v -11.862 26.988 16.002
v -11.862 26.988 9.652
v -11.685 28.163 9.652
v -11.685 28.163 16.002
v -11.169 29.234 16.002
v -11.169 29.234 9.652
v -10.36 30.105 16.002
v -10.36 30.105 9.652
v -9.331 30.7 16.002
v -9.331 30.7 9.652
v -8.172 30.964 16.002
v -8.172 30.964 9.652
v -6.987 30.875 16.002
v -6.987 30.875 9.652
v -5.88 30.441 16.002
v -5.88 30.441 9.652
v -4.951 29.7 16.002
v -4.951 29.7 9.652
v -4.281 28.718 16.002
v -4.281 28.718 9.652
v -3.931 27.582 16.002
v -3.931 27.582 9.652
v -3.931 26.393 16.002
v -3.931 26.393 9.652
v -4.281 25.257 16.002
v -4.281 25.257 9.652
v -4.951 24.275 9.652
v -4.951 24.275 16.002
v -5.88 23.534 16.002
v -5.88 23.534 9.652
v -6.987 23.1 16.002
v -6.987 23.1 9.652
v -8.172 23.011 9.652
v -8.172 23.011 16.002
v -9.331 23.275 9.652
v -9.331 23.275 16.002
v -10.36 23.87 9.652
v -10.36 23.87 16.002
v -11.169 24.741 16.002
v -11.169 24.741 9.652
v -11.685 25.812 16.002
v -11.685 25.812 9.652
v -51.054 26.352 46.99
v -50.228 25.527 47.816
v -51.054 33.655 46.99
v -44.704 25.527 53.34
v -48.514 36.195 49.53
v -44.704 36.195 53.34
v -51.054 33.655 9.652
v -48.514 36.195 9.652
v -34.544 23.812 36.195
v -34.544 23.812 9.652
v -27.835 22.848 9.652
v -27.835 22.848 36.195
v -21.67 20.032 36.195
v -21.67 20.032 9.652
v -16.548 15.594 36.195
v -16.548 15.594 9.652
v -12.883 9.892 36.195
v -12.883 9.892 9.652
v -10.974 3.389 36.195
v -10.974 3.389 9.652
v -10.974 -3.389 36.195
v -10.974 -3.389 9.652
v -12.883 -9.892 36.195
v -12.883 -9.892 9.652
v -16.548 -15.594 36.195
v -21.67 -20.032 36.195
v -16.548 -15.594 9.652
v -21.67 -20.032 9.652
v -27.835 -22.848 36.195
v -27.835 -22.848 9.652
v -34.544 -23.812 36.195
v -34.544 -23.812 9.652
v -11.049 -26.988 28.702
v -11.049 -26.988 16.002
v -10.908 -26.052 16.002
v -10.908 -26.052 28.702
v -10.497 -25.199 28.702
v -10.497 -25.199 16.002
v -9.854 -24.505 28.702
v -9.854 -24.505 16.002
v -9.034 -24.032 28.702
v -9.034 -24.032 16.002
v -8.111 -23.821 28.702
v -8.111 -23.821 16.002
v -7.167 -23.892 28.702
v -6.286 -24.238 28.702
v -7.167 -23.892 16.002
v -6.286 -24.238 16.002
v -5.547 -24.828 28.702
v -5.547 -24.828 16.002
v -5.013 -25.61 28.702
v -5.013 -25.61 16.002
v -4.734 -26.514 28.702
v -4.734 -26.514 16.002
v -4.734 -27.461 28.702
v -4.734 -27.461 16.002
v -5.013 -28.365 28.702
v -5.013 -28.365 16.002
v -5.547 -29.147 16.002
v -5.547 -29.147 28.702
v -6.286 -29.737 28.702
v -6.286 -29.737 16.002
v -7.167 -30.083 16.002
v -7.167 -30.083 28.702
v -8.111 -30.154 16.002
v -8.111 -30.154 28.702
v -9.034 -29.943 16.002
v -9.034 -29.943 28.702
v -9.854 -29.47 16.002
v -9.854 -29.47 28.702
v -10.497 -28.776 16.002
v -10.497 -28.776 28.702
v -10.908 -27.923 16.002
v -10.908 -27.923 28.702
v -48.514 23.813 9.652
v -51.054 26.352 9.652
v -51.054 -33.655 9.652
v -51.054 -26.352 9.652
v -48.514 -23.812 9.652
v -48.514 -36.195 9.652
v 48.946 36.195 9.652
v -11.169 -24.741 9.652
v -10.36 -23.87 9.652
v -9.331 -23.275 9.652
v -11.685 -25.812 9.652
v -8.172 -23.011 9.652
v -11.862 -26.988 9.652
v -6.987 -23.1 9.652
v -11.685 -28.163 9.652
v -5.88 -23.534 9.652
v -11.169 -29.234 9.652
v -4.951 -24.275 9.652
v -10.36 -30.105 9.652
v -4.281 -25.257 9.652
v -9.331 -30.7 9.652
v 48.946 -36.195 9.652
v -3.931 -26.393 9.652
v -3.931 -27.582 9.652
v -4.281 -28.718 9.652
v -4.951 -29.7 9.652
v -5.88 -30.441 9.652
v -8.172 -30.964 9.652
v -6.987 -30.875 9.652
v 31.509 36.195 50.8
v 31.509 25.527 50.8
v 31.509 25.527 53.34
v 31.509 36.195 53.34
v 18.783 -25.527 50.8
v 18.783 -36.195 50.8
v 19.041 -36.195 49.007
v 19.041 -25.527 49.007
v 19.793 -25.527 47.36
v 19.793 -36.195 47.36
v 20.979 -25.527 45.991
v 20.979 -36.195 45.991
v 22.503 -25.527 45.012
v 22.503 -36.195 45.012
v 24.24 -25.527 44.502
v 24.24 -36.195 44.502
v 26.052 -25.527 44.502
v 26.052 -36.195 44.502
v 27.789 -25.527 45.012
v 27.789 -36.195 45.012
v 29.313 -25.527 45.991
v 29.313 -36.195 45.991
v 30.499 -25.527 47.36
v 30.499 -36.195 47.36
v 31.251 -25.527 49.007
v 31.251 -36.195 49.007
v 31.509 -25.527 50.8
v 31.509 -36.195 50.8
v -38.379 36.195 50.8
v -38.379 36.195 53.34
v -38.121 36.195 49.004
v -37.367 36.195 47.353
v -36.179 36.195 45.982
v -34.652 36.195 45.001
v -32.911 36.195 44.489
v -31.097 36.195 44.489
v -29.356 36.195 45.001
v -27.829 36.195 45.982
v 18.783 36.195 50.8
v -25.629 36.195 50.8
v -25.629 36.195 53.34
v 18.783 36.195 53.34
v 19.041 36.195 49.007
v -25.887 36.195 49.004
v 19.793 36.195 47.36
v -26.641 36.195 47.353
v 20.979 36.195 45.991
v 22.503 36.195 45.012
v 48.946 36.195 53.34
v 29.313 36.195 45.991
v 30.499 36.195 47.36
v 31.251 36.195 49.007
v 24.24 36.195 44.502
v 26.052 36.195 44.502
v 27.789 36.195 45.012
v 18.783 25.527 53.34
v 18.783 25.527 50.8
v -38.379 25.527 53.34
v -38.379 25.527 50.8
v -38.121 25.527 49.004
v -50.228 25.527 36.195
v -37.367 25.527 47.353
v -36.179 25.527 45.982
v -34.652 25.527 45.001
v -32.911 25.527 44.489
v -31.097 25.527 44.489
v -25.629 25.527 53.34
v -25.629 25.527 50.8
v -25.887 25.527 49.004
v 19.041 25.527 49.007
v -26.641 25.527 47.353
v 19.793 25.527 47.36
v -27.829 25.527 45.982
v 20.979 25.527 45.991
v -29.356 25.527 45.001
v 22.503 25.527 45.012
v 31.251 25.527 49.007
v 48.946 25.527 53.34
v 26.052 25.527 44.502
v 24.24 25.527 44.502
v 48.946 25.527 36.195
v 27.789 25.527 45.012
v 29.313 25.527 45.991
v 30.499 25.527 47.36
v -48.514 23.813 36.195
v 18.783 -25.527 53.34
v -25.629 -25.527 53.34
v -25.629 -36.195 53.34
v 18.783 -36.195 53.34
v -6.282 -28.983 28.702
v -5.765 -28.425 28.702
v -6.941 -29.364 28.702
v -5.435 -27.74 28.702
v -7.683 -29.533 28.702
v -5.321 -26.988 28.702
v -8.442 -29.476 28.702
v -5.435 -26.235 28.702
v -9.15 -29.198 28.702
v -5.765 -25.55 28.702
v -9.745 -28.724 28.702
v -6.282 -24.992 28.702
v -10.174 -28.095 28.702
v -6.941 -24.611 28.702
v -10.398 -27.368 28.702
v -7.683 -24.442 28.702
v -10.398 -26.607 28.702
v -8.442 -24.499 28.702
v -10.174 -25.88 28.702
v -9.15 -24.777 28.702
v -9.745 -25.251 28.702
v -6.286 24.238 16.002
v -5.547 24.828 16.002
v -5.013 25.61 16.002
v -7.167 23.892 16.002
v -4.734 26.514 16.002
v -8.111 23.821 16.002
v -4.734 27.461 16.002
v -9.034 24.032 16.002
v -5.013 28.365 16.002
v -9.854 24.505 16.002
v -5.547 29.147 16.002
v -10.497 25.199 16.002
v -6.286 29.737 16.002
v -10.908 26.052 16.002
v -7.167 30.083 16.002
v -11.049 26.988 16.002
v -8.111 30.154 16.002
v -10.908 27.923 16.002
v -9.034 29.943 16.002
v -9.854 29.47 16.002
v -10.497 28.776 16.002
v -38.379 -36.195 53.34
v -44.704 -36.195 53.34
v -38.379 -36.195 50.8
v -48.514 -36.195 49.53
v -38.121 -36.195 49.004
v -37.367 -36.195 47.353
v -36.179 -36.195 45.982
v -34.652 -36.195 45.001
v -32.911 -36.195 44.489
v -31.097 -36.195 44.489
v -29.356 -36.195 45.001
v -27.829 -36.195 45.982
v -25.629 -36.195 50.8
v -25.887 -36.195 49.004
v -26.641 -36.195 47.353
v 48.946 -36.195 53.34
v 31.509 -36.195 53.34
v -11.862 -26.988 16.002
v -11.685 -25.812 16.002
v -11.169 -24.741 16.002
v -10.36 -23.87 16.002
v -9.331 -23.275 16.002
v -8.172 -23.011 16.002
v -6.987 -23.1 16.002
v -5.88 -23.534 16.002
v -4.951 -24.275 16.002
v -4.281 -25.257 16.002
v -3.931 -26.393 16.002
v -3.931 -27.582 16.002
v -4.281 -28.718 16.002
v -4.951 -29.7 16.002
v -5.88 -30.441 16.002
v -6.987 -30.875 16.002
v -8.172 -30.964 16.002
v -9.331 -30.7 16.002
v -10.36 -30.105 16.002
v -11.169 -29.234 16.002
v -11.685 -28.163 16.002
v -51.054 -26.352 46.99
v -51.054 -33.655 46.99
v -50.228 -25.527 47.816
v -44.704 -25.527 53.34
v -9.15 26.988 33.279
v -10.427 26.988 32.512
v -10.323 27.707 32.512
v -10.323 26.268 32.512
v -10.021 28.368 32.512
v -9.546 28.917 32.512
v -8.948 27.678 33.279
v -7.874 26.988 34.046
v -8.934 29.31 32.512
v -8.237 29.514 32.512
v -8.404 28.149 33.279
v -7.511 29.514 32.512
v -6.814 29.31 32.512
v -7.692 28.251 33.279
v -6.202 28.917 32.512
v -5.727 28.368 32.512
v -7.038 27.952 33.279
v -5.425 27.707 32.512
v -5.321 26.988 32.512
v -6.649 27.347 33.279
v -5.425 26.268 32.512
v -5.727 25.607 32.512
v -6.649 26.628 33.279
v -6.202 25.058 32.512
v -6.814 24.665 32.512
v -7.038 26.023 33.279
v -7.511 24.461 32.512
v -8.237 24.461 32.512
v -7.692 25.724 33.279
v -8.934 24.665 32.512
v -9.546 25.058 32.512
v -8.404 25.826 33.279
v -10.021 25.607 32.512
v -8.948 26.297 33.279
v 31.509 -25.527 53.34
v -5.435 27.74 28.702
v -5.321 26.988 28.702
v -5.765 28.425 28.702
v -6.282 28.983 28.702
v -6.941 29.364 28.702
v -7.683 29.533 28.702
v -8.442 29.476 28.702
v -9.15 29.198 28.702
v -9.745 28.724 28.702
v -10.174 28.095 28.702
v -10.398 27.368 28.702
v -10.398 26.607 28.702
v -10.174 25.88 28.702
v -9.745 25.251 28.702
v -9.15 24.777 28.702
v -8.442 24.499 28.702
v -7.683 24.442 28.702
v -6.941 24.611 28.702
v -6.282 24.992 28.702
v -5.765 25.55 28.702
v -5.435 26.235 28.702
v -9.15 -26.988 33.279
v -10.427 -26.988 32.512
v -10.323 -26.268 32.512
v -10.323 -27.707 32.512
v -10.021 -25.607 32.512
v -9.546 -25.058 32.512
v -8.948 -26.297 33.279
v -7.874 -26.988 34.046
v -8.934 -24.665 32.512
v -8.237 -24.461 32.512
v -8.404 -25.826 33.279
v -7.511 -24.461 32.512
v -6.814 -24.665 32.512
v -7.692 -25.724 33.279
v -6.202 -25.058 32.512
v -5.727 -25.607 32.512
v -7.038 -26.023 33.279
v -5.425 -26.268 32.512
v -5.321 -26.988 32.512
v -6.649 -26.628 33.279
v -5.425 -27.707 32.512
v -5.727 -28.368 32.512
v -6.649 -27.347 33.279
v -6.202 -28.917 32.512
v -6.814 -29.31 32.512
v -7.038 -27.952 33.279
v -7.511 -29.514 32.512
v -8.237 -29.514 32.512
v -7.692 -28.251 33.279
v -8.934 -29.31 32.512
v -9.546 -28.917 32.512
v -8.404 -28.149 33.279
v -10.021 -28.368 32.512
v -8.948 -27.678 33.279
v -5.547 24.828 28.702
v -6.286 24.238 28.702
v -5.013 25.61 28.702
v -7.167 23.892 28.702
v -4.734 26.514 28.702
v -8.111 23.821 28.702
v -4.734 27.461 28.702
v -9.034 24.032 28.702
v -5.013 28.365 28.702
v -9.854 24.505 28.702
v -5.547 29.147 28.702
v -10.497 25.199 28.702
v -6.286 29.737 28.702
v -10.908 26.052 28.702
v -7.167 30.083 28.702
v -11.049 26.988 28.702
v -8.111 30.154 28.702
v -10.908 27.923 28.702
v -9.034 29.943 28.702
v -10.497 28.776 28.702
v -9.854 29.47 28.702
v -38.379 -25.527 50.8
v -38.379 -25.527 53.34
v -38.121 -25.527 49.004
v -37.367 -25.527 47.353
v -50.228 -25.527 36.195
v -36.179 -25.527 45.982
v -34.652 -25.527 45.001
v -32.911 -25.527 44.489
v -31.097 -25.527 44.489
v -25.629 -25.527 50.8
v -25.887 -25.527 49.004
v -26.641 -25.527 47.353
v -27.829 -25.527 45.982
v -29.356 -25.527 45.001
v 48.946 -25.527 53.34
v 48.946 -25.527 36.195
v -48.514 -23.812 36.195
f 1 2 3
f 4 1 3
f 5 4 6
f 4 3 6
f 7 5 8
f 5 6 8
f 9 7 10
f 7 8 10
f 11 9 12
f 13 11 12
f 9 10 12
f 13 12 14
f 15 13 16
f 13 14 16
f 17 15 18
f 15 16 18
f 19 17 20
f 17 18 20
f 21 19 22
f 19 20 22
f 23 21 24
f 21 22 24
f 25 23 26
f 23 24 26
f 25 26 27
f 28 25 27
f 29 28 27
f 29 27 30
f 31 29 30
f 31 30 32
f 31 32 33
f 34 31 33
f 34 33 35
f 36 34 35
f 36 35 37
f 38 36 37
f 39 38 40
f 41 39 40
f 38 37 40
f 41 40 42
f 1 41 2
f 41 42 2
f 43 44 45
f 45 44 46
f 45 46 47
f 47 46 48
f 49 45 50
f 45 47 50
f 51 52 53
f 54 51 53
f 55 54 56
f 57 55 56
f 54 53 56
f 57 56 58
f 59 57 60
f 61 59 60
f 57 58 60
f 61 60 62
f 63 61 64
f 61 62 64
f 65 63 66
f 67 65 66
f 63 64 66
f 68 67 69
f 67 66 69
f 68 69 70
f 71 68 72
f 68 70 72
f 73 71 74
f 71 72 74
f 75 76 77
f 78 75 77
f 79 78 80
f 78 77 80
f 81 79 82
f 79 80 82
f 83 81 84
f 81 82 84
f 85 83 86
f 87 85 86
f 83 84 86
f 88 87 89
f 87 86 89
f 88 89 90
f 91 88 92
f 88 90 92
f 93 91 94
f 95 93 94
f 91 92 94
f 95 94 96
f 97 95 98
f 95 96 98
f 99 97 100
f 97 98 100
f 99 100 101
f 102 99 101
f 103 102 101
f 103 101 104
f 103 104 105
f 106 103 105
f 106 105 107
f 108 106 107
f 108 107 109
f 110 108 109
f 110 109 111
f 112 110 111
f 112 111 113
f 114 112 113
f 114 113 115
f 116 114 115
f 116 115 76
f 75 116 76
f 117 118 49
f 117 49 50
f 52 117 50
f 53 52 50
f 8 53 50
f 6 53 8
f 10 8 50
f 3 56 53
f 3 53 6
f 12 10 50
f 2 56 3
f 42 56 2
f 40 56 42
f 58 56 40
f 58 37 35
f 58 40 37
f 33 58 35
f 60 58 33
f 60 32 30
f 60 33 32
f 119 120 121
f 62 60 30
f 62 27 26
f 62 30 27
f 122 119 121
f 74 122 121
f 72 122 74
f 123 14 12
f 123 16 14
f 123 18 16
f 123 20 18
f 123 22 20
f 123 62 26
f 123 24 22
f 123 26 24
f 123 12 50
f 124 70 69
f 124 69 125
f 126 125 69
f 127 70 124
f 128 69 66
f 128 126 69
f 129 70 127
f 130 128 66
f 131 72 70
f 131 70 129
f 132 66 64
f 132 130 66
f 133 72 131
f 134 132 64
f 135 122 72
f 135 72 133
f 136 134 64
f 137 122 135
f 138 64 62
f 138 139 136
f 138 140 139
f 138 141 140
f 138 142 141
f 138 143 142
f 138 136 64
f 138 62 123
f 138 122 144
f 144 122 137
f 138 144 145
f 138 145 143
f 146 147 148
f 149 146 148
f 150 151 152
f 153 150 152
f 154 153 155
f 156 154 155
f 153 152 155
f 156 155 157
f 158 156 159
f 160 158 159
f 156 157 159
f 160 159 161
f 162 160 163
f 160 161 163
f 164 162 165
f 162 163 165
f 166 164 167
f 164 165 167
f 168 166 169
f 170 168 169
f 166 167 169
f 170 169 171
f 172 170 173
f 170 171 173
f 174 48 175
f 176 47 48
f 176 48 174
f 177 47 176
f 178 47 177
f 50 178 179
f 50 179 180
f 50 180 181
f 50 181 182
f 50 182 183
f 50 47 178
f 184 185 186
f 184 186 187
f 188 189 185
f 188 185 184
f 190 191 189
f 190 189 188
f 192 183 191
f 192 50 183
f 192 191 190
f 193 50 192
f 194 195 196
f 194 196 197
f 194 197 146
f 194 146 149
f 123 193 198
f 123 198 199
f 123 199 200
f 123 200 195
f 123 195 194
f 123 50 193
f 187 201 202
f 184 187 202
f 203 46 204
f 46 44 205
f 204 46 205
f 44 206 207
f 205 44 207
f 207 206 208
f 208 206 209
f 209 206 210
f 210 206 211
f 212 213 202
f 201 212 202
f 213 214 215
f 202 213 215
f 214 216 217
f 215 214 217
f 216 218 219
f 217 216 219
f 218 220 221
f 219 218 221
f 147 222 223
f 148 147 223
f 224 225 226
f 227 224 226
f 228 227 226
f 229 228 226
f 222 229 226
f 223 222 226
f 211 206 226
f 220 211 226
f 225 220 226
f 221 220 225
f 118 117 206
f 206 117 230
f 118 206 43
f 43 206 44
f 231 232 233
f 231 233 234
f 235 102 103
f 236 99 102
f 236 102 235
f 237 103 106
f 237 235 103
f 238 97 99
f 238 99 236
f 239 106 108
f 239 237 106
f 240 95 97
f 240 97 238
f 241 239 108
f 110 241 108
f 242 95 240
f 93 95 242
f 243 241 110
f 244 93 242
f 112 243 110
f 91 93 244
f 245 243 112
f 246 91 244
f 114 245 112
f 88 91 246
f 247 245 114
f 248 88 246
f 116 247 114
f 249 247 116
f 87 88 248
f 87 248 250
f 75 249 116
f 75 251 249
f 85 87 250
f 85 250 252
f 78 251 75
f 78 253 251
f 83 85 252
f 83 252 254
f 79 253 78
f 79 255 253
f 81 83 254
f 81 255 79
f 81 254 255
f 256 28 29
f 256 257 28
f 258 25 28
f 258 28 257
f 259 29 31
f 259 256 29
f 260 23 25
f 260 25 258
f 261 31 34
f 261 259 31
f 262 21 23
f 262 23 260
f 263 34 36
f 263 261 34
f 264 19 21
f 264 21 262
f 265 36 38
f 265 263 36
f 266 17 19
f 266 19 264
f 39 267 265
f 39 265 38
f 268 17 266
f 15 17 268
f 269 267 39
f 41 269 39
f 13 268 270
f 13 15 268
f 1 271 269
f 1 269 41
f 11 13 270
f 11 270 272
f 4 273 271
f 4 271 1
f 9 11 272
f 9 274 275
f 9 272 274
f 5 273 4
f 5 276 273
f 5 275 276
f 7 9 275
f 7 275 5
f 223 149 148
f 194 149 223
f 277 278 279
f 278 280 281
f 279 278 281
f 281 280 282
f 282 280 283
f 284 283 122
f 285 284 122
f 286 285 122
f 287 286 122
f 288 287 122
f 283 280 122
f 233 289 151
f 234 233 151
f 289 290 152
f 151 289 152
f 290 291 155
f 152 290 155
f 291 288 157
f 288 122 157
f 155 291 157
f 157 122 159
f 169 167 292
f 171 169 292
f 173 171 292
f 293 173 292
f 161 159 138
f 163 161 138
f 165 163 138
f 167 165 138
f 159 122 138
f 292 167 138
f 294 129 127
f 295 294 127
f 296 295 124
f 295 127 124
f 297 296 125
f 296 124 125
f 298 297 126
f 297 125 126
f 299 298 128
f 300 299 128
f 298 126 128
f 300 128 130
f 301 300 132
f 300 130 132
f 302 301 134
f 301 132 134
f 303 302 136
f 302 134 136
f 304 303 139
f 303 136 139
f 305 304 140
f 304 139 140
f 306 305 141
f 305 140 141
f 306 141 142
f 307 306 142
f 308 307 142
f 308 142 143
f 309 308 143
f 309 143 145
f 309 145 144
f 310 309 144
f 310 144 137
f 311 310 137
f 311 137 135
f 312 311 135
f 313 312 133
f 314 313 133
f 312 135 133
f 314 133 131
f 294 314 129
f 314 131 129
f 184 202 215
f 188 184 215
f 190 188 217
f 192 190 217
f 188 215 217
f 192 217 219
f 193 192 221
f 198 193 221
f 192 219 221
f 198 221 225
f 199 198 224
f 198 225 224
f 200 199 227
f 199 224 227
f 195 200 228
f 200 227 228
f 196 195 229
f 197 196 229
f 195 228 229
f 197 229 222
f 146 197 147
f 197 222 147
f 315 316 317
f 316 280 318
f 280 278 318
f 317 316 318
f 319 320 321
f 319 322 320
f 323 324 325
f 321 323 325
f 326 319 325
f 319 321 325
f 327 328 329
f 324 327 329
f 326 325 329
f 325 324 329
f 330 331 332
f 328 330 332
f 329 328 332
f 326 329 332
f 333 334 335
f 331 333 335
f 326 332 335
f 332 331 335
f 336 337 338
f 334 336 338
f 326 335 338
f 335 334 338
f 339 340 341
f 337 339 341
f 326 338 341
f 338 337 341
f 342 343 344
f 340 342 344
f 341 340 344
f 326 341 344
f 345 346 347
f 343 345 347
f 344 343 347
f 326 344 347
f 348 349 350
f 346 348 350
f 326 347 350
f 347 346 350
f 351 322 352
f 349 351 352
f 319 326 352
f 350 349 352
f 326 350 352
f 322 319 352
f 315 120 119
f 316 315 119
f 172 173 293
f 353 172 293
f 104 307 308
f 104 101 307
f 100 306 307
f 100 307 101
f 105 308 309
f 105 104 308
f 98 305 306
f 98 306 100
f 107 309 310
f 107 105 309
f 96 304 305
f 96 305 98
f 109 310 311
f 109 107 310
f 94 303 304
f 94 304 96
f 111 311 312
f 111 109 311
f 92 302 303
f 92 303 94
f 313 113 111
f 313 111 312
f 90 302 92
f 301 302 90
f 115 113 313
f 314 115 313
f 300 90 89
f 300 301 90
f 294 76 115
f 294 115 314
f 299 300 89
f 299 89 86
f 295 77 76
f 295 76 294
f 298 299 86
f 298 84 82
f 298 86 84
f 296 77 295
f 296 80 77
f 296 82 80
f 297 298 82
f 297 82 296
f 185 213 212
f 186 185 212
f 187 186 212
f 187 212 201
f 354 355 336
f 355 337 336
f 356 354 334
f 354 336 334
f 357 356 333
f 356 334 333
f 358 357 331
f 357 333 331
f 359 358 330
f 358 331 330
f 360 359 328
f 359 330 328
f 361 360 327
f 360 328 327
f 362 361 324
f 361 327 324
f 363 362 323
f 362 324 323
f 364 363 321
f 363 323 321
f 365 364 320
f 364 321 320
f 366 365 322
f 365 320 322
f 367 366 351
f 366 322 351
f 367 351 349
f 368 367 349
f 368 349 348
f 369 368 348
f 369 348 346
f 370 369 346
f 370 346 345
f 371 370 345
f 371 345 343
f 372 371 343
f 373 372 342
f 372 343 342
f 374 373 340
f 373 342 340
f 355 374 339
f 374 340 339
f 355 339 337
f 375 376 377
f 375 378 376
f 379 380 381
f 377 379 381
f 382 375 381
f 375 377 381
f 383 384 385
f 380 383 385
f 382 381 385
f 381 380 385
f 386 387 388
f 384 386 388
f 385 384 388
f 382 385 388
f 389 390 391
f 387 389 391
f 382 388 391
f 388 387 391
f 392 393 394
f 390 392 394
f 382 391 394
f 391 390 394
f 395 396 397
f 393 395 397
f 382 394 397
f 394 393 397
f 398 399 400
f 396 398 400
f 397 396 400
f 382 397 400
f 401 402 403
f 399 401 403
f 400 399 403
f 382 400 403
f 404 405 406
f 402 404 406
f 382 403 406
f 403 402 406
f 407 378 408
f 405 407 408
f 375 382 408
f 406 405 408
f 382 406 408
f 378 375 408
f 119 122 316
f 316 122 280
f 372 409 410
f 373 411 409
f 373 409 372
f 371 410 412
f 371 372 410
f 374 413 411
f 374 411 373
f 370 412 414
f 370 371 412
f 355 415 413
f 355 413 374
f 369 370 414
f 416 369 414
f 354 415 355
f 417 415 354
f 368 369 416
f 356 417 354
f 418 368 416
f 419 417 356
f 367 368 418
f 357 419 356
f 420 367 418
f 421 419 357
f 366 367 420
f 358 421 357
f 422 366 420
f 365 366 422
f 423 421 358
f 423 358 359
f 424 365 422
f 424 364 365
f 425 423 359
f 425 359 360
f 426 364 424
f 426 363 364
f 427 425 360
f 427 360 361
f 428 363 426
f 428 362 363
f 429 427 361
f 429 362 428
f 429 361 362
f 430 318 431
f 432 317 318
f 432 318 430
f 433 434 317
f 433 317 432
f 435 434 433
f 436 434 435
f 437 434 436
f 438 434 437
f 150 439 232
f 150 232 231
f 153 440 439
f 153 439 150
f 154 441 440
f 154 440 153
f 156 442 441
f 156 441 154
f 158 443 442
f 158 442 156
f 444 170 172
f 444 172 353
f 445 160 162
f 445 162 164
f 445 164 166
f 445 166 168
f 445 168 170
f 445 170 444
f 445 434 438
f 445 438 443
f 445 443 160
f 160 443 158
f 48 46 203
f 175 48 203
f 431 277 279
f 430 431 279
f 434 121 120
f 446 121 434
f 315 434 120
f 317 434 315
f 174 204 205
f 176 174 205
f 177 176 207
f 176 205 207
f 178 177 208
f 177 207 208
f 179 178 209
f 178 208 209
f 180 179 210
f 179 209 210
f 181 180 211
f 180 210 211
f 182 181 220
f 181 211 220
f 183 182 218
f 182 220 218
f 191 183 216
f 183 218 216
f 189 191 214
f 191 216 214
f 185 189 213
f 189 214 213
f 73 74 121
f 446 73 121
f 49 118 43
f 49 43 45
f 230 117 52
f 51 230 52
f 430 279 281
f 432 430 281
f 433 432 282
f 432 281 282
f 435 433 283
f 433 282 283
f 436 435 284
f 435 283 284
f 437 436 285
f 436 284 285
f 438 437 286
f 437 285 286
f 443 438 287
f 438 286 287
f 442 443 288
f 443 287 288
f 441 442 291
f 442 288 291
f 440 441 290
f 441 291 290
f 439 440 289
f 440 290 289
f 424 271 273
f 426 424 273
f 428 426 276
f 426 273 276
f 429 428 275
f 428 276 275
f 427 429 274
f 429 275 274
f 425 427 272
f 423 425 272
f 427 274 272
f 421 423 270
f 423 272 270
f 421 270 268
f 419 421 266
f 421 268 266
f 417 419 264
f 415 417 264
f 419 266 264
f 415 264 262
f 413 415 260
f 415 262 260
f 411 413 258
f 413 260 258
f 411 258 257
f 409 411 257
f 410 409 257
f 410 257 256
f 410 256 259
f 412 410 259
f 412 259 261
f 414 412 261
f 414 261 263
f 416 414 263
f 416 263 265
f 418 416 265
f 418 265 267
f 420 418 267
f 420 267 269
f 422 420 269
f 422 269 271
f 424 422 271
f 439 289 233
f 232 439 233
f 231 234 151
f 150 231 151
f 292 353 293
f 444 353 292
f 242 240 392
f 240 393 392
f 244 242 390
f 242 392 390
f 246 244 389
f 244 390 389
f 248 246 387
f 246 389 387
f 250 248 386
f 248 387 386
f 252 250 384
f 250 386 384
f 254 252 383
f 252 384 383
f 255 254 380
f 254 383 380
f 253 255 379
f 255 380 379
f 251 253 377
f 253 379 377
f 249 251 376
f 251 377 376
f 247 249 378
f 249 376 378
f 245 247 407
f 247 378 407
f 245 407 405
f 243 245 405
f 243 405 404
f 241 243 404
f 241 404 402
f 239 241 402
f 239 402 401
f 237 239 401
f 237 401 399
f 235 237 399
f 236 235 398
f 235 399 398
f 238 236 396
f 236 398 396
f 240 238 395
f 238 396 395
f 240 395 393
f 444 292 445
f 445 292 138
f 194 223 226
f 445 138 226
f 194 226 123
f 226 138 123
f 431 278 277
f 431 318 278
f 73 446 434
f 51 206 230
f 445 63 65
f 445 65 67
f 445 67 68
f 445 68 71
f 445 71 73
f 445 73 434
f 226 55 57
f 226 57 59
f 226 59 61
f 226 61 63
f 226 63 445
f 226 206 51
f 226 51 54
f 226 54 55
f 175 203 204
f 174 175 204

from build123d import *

# Parameters (mm, degrees)
EXTRUDE1_DEPTH                    = 36.195
SKETCH17_W                        = 99.9998
SKETCH17_H                        = 10.668
EXTRUDE4_DEPTH                    = 17.145
CUT_EXTRUDE2_DEPTH                = 73.39
SKETCH19_W                        = 99.9998
SKETCH19_H                        = 9.652
CUT_EXTRUDE3_DEPTH                = 86.2
F_1_4_20_TAPPED_HOLE1_D           = 5.1054
F_1_4_20_TAPPED_HOLE1_DEPTH       = 22.86
F_1_4_20_TAPPED_HOLE1_CBORE_D     = 6.35
F_1_4_20_TAPPED_HOLE1_CBORE_DEPTH = 19.05
F_1_4_20_TAPPED_HOLE1_TIP         = 1.533816902
CHAMFER1_SIZE                     = 2.54
SKETCH24_R                        = 3.9878
EXTRUDE5_DEPTH                    = 6.35
CHAMFER3_SIZE                     = 6.35


with BuildPart() as part:
    # Sketch5 → Extrude1 (new body)
    with BuildSketch(Plane.XY):
        with BuildLine():
            Line((48.9458, -36.195), (48.9458, 36.195))
            Line((48.9458, 36.195), (-51.054, 36.195))
            Line((-51.054, 36.195), (-51.054, 23.8125))
            Line((-51.054, 23.8125), (-34.544, 23.8125))
            ThreePointArc((-34.544, 23.8125), (-10.7315, 0), (-34.544, -23.8125))
            Line((-34.544, -23.8125), (-51.054, -23.8125))
            Line((-51.054, -23.8125), (-51.054, -36.195))
            Line((-51.054, -36.195), (48.9458, -36.195))
        make_face()
    extrude(amount=EXTRUDE1_DEPTH)

    # Sketch17 → Extrude4 (add)
    with BuildSketch(Plane.XY.offset(36.195)):
        with Locations((-1.0541, 30.861)):
            Rectangle(SKETCH17_W, SKETCH17_H)
        with Locations((-1.0541, -30.861)):
            Rectangle(SKETCH17_W, SKETCH17_H)
    extrude(amount=EXTRUDE4_DEPTH)

    # Sketch16 → Cut-Extrude2 (cut, through all)
    with BuildSketch(Plane.XZ.offset(36.195)):
        with BuildLine():
            Line((-25.6286, 50.8), (-25.6286, 53.34))
            Line((-25.6286, 53.34), (-38.3794, 53.34))
            Line((-38.3794, 53.34), (-38.3794, 50.8))
            ThreePointArc((-38.3794, 50.8), (-32.004, 44.4246), (-25.6286, 50.8))
        make_face()
        with BuildLine():
            Line((31.5087, 50.8), (31.5087, 53.34))
            Line((31.5087, 53.34), (18.7833, 53.34))
            Line((18.7833, 53.34), (18.7833, 50.8))
            ThreePointArc((18.7833, 50.8), (25.146, 44.4373), (31.5087, 50.8))
        make_face()
    extrude(amount=-CUT_EXTRUDE2_DEPTH, mode=Mode.SUBTRACT)

    # Sketch19 → Cut-Extrude3 (cut)
    with BuildSketch(Plane.XZ.offset(36.195)):
        with Locations((-1.0541, 4.826)):
            Rectangle(SKETCH19_W, SKETCH19_H)
    extrude(amount=-CUT_EXTRUDE3_DEPTH, mode=Mode.SUBTRACT)

    # 1_4-20 Tapped Hole1
    with Locations(Plane(origin=(0, 0, 9.652), x_dir=(-1, 0, 0), z_dir=(0, 0, -1))):
        with Locations((7.874, 26.9875), (7.874, -26.9875)):
            CounterBoreHole(F_1_4_20_TAPPED_HOLE1_D / 2, F_1_4_20_TAPPED_HOLE1_CBORE_D / 2, F_1_4_20_TAPPED_HOLE1_CBORE_DEPTH, depth=F_1_4_20_TAPPED_HOLE1_DEPTH)
            with Locations((0, 0, -(F_1_4_20_TAPPED_HOLE1_DEPTH + F_1_4_20_TAPPED_HOLE1_TIP / 2))):  # 118° drill point
                Cone(0, F_1_4_20_TAPPED_HOLE1_D / 2, F_1_4_20_TAPPED_HOLE1_TIP, mode=Mode.SUBTRACT)

    # Chamfer1
    chamfer1_edges = [part.edges().sort_by_distance(p)[0] for p in [
        (-51.054, -23.8125, 22.9235),
        (-51.054, 23.8125, 22.9235),
        (-51.054, -36.195, 31.496),
        (-51.054, 36.195, 31.496),
    ]]
    chamfer(chamfer1_edges, length=CHAMFER1_SIZE)

    # Sketch24 → Extrude5 (cut)
    with BuildSketch(Plane(origin=(0, 0, 9.652), x_dir=(-1, 0, 0), z_dir=(0, 0, -1))):
        with Locations((7.874, -26.9875)):
            Circle(SKETCH24_R)
        with Locations((7.874, 26.9875)):
            Circle(SKETCH24_R)
    extrude(amount=-EXTRUDE5_DEPTH, mode=Mode.SUBTRACT)

    # Chamfer3
    chamfer3_edges = [part.edges().sort_by_distance(p)[0] for p in [
        (-51.054, -30.00375, 53.34),
        (-51.054, 30.00375, 53.34),
    ]]
    chamfer(chamfer3_edges, length=CHAMFER3_SIZE)


solid = part.part
